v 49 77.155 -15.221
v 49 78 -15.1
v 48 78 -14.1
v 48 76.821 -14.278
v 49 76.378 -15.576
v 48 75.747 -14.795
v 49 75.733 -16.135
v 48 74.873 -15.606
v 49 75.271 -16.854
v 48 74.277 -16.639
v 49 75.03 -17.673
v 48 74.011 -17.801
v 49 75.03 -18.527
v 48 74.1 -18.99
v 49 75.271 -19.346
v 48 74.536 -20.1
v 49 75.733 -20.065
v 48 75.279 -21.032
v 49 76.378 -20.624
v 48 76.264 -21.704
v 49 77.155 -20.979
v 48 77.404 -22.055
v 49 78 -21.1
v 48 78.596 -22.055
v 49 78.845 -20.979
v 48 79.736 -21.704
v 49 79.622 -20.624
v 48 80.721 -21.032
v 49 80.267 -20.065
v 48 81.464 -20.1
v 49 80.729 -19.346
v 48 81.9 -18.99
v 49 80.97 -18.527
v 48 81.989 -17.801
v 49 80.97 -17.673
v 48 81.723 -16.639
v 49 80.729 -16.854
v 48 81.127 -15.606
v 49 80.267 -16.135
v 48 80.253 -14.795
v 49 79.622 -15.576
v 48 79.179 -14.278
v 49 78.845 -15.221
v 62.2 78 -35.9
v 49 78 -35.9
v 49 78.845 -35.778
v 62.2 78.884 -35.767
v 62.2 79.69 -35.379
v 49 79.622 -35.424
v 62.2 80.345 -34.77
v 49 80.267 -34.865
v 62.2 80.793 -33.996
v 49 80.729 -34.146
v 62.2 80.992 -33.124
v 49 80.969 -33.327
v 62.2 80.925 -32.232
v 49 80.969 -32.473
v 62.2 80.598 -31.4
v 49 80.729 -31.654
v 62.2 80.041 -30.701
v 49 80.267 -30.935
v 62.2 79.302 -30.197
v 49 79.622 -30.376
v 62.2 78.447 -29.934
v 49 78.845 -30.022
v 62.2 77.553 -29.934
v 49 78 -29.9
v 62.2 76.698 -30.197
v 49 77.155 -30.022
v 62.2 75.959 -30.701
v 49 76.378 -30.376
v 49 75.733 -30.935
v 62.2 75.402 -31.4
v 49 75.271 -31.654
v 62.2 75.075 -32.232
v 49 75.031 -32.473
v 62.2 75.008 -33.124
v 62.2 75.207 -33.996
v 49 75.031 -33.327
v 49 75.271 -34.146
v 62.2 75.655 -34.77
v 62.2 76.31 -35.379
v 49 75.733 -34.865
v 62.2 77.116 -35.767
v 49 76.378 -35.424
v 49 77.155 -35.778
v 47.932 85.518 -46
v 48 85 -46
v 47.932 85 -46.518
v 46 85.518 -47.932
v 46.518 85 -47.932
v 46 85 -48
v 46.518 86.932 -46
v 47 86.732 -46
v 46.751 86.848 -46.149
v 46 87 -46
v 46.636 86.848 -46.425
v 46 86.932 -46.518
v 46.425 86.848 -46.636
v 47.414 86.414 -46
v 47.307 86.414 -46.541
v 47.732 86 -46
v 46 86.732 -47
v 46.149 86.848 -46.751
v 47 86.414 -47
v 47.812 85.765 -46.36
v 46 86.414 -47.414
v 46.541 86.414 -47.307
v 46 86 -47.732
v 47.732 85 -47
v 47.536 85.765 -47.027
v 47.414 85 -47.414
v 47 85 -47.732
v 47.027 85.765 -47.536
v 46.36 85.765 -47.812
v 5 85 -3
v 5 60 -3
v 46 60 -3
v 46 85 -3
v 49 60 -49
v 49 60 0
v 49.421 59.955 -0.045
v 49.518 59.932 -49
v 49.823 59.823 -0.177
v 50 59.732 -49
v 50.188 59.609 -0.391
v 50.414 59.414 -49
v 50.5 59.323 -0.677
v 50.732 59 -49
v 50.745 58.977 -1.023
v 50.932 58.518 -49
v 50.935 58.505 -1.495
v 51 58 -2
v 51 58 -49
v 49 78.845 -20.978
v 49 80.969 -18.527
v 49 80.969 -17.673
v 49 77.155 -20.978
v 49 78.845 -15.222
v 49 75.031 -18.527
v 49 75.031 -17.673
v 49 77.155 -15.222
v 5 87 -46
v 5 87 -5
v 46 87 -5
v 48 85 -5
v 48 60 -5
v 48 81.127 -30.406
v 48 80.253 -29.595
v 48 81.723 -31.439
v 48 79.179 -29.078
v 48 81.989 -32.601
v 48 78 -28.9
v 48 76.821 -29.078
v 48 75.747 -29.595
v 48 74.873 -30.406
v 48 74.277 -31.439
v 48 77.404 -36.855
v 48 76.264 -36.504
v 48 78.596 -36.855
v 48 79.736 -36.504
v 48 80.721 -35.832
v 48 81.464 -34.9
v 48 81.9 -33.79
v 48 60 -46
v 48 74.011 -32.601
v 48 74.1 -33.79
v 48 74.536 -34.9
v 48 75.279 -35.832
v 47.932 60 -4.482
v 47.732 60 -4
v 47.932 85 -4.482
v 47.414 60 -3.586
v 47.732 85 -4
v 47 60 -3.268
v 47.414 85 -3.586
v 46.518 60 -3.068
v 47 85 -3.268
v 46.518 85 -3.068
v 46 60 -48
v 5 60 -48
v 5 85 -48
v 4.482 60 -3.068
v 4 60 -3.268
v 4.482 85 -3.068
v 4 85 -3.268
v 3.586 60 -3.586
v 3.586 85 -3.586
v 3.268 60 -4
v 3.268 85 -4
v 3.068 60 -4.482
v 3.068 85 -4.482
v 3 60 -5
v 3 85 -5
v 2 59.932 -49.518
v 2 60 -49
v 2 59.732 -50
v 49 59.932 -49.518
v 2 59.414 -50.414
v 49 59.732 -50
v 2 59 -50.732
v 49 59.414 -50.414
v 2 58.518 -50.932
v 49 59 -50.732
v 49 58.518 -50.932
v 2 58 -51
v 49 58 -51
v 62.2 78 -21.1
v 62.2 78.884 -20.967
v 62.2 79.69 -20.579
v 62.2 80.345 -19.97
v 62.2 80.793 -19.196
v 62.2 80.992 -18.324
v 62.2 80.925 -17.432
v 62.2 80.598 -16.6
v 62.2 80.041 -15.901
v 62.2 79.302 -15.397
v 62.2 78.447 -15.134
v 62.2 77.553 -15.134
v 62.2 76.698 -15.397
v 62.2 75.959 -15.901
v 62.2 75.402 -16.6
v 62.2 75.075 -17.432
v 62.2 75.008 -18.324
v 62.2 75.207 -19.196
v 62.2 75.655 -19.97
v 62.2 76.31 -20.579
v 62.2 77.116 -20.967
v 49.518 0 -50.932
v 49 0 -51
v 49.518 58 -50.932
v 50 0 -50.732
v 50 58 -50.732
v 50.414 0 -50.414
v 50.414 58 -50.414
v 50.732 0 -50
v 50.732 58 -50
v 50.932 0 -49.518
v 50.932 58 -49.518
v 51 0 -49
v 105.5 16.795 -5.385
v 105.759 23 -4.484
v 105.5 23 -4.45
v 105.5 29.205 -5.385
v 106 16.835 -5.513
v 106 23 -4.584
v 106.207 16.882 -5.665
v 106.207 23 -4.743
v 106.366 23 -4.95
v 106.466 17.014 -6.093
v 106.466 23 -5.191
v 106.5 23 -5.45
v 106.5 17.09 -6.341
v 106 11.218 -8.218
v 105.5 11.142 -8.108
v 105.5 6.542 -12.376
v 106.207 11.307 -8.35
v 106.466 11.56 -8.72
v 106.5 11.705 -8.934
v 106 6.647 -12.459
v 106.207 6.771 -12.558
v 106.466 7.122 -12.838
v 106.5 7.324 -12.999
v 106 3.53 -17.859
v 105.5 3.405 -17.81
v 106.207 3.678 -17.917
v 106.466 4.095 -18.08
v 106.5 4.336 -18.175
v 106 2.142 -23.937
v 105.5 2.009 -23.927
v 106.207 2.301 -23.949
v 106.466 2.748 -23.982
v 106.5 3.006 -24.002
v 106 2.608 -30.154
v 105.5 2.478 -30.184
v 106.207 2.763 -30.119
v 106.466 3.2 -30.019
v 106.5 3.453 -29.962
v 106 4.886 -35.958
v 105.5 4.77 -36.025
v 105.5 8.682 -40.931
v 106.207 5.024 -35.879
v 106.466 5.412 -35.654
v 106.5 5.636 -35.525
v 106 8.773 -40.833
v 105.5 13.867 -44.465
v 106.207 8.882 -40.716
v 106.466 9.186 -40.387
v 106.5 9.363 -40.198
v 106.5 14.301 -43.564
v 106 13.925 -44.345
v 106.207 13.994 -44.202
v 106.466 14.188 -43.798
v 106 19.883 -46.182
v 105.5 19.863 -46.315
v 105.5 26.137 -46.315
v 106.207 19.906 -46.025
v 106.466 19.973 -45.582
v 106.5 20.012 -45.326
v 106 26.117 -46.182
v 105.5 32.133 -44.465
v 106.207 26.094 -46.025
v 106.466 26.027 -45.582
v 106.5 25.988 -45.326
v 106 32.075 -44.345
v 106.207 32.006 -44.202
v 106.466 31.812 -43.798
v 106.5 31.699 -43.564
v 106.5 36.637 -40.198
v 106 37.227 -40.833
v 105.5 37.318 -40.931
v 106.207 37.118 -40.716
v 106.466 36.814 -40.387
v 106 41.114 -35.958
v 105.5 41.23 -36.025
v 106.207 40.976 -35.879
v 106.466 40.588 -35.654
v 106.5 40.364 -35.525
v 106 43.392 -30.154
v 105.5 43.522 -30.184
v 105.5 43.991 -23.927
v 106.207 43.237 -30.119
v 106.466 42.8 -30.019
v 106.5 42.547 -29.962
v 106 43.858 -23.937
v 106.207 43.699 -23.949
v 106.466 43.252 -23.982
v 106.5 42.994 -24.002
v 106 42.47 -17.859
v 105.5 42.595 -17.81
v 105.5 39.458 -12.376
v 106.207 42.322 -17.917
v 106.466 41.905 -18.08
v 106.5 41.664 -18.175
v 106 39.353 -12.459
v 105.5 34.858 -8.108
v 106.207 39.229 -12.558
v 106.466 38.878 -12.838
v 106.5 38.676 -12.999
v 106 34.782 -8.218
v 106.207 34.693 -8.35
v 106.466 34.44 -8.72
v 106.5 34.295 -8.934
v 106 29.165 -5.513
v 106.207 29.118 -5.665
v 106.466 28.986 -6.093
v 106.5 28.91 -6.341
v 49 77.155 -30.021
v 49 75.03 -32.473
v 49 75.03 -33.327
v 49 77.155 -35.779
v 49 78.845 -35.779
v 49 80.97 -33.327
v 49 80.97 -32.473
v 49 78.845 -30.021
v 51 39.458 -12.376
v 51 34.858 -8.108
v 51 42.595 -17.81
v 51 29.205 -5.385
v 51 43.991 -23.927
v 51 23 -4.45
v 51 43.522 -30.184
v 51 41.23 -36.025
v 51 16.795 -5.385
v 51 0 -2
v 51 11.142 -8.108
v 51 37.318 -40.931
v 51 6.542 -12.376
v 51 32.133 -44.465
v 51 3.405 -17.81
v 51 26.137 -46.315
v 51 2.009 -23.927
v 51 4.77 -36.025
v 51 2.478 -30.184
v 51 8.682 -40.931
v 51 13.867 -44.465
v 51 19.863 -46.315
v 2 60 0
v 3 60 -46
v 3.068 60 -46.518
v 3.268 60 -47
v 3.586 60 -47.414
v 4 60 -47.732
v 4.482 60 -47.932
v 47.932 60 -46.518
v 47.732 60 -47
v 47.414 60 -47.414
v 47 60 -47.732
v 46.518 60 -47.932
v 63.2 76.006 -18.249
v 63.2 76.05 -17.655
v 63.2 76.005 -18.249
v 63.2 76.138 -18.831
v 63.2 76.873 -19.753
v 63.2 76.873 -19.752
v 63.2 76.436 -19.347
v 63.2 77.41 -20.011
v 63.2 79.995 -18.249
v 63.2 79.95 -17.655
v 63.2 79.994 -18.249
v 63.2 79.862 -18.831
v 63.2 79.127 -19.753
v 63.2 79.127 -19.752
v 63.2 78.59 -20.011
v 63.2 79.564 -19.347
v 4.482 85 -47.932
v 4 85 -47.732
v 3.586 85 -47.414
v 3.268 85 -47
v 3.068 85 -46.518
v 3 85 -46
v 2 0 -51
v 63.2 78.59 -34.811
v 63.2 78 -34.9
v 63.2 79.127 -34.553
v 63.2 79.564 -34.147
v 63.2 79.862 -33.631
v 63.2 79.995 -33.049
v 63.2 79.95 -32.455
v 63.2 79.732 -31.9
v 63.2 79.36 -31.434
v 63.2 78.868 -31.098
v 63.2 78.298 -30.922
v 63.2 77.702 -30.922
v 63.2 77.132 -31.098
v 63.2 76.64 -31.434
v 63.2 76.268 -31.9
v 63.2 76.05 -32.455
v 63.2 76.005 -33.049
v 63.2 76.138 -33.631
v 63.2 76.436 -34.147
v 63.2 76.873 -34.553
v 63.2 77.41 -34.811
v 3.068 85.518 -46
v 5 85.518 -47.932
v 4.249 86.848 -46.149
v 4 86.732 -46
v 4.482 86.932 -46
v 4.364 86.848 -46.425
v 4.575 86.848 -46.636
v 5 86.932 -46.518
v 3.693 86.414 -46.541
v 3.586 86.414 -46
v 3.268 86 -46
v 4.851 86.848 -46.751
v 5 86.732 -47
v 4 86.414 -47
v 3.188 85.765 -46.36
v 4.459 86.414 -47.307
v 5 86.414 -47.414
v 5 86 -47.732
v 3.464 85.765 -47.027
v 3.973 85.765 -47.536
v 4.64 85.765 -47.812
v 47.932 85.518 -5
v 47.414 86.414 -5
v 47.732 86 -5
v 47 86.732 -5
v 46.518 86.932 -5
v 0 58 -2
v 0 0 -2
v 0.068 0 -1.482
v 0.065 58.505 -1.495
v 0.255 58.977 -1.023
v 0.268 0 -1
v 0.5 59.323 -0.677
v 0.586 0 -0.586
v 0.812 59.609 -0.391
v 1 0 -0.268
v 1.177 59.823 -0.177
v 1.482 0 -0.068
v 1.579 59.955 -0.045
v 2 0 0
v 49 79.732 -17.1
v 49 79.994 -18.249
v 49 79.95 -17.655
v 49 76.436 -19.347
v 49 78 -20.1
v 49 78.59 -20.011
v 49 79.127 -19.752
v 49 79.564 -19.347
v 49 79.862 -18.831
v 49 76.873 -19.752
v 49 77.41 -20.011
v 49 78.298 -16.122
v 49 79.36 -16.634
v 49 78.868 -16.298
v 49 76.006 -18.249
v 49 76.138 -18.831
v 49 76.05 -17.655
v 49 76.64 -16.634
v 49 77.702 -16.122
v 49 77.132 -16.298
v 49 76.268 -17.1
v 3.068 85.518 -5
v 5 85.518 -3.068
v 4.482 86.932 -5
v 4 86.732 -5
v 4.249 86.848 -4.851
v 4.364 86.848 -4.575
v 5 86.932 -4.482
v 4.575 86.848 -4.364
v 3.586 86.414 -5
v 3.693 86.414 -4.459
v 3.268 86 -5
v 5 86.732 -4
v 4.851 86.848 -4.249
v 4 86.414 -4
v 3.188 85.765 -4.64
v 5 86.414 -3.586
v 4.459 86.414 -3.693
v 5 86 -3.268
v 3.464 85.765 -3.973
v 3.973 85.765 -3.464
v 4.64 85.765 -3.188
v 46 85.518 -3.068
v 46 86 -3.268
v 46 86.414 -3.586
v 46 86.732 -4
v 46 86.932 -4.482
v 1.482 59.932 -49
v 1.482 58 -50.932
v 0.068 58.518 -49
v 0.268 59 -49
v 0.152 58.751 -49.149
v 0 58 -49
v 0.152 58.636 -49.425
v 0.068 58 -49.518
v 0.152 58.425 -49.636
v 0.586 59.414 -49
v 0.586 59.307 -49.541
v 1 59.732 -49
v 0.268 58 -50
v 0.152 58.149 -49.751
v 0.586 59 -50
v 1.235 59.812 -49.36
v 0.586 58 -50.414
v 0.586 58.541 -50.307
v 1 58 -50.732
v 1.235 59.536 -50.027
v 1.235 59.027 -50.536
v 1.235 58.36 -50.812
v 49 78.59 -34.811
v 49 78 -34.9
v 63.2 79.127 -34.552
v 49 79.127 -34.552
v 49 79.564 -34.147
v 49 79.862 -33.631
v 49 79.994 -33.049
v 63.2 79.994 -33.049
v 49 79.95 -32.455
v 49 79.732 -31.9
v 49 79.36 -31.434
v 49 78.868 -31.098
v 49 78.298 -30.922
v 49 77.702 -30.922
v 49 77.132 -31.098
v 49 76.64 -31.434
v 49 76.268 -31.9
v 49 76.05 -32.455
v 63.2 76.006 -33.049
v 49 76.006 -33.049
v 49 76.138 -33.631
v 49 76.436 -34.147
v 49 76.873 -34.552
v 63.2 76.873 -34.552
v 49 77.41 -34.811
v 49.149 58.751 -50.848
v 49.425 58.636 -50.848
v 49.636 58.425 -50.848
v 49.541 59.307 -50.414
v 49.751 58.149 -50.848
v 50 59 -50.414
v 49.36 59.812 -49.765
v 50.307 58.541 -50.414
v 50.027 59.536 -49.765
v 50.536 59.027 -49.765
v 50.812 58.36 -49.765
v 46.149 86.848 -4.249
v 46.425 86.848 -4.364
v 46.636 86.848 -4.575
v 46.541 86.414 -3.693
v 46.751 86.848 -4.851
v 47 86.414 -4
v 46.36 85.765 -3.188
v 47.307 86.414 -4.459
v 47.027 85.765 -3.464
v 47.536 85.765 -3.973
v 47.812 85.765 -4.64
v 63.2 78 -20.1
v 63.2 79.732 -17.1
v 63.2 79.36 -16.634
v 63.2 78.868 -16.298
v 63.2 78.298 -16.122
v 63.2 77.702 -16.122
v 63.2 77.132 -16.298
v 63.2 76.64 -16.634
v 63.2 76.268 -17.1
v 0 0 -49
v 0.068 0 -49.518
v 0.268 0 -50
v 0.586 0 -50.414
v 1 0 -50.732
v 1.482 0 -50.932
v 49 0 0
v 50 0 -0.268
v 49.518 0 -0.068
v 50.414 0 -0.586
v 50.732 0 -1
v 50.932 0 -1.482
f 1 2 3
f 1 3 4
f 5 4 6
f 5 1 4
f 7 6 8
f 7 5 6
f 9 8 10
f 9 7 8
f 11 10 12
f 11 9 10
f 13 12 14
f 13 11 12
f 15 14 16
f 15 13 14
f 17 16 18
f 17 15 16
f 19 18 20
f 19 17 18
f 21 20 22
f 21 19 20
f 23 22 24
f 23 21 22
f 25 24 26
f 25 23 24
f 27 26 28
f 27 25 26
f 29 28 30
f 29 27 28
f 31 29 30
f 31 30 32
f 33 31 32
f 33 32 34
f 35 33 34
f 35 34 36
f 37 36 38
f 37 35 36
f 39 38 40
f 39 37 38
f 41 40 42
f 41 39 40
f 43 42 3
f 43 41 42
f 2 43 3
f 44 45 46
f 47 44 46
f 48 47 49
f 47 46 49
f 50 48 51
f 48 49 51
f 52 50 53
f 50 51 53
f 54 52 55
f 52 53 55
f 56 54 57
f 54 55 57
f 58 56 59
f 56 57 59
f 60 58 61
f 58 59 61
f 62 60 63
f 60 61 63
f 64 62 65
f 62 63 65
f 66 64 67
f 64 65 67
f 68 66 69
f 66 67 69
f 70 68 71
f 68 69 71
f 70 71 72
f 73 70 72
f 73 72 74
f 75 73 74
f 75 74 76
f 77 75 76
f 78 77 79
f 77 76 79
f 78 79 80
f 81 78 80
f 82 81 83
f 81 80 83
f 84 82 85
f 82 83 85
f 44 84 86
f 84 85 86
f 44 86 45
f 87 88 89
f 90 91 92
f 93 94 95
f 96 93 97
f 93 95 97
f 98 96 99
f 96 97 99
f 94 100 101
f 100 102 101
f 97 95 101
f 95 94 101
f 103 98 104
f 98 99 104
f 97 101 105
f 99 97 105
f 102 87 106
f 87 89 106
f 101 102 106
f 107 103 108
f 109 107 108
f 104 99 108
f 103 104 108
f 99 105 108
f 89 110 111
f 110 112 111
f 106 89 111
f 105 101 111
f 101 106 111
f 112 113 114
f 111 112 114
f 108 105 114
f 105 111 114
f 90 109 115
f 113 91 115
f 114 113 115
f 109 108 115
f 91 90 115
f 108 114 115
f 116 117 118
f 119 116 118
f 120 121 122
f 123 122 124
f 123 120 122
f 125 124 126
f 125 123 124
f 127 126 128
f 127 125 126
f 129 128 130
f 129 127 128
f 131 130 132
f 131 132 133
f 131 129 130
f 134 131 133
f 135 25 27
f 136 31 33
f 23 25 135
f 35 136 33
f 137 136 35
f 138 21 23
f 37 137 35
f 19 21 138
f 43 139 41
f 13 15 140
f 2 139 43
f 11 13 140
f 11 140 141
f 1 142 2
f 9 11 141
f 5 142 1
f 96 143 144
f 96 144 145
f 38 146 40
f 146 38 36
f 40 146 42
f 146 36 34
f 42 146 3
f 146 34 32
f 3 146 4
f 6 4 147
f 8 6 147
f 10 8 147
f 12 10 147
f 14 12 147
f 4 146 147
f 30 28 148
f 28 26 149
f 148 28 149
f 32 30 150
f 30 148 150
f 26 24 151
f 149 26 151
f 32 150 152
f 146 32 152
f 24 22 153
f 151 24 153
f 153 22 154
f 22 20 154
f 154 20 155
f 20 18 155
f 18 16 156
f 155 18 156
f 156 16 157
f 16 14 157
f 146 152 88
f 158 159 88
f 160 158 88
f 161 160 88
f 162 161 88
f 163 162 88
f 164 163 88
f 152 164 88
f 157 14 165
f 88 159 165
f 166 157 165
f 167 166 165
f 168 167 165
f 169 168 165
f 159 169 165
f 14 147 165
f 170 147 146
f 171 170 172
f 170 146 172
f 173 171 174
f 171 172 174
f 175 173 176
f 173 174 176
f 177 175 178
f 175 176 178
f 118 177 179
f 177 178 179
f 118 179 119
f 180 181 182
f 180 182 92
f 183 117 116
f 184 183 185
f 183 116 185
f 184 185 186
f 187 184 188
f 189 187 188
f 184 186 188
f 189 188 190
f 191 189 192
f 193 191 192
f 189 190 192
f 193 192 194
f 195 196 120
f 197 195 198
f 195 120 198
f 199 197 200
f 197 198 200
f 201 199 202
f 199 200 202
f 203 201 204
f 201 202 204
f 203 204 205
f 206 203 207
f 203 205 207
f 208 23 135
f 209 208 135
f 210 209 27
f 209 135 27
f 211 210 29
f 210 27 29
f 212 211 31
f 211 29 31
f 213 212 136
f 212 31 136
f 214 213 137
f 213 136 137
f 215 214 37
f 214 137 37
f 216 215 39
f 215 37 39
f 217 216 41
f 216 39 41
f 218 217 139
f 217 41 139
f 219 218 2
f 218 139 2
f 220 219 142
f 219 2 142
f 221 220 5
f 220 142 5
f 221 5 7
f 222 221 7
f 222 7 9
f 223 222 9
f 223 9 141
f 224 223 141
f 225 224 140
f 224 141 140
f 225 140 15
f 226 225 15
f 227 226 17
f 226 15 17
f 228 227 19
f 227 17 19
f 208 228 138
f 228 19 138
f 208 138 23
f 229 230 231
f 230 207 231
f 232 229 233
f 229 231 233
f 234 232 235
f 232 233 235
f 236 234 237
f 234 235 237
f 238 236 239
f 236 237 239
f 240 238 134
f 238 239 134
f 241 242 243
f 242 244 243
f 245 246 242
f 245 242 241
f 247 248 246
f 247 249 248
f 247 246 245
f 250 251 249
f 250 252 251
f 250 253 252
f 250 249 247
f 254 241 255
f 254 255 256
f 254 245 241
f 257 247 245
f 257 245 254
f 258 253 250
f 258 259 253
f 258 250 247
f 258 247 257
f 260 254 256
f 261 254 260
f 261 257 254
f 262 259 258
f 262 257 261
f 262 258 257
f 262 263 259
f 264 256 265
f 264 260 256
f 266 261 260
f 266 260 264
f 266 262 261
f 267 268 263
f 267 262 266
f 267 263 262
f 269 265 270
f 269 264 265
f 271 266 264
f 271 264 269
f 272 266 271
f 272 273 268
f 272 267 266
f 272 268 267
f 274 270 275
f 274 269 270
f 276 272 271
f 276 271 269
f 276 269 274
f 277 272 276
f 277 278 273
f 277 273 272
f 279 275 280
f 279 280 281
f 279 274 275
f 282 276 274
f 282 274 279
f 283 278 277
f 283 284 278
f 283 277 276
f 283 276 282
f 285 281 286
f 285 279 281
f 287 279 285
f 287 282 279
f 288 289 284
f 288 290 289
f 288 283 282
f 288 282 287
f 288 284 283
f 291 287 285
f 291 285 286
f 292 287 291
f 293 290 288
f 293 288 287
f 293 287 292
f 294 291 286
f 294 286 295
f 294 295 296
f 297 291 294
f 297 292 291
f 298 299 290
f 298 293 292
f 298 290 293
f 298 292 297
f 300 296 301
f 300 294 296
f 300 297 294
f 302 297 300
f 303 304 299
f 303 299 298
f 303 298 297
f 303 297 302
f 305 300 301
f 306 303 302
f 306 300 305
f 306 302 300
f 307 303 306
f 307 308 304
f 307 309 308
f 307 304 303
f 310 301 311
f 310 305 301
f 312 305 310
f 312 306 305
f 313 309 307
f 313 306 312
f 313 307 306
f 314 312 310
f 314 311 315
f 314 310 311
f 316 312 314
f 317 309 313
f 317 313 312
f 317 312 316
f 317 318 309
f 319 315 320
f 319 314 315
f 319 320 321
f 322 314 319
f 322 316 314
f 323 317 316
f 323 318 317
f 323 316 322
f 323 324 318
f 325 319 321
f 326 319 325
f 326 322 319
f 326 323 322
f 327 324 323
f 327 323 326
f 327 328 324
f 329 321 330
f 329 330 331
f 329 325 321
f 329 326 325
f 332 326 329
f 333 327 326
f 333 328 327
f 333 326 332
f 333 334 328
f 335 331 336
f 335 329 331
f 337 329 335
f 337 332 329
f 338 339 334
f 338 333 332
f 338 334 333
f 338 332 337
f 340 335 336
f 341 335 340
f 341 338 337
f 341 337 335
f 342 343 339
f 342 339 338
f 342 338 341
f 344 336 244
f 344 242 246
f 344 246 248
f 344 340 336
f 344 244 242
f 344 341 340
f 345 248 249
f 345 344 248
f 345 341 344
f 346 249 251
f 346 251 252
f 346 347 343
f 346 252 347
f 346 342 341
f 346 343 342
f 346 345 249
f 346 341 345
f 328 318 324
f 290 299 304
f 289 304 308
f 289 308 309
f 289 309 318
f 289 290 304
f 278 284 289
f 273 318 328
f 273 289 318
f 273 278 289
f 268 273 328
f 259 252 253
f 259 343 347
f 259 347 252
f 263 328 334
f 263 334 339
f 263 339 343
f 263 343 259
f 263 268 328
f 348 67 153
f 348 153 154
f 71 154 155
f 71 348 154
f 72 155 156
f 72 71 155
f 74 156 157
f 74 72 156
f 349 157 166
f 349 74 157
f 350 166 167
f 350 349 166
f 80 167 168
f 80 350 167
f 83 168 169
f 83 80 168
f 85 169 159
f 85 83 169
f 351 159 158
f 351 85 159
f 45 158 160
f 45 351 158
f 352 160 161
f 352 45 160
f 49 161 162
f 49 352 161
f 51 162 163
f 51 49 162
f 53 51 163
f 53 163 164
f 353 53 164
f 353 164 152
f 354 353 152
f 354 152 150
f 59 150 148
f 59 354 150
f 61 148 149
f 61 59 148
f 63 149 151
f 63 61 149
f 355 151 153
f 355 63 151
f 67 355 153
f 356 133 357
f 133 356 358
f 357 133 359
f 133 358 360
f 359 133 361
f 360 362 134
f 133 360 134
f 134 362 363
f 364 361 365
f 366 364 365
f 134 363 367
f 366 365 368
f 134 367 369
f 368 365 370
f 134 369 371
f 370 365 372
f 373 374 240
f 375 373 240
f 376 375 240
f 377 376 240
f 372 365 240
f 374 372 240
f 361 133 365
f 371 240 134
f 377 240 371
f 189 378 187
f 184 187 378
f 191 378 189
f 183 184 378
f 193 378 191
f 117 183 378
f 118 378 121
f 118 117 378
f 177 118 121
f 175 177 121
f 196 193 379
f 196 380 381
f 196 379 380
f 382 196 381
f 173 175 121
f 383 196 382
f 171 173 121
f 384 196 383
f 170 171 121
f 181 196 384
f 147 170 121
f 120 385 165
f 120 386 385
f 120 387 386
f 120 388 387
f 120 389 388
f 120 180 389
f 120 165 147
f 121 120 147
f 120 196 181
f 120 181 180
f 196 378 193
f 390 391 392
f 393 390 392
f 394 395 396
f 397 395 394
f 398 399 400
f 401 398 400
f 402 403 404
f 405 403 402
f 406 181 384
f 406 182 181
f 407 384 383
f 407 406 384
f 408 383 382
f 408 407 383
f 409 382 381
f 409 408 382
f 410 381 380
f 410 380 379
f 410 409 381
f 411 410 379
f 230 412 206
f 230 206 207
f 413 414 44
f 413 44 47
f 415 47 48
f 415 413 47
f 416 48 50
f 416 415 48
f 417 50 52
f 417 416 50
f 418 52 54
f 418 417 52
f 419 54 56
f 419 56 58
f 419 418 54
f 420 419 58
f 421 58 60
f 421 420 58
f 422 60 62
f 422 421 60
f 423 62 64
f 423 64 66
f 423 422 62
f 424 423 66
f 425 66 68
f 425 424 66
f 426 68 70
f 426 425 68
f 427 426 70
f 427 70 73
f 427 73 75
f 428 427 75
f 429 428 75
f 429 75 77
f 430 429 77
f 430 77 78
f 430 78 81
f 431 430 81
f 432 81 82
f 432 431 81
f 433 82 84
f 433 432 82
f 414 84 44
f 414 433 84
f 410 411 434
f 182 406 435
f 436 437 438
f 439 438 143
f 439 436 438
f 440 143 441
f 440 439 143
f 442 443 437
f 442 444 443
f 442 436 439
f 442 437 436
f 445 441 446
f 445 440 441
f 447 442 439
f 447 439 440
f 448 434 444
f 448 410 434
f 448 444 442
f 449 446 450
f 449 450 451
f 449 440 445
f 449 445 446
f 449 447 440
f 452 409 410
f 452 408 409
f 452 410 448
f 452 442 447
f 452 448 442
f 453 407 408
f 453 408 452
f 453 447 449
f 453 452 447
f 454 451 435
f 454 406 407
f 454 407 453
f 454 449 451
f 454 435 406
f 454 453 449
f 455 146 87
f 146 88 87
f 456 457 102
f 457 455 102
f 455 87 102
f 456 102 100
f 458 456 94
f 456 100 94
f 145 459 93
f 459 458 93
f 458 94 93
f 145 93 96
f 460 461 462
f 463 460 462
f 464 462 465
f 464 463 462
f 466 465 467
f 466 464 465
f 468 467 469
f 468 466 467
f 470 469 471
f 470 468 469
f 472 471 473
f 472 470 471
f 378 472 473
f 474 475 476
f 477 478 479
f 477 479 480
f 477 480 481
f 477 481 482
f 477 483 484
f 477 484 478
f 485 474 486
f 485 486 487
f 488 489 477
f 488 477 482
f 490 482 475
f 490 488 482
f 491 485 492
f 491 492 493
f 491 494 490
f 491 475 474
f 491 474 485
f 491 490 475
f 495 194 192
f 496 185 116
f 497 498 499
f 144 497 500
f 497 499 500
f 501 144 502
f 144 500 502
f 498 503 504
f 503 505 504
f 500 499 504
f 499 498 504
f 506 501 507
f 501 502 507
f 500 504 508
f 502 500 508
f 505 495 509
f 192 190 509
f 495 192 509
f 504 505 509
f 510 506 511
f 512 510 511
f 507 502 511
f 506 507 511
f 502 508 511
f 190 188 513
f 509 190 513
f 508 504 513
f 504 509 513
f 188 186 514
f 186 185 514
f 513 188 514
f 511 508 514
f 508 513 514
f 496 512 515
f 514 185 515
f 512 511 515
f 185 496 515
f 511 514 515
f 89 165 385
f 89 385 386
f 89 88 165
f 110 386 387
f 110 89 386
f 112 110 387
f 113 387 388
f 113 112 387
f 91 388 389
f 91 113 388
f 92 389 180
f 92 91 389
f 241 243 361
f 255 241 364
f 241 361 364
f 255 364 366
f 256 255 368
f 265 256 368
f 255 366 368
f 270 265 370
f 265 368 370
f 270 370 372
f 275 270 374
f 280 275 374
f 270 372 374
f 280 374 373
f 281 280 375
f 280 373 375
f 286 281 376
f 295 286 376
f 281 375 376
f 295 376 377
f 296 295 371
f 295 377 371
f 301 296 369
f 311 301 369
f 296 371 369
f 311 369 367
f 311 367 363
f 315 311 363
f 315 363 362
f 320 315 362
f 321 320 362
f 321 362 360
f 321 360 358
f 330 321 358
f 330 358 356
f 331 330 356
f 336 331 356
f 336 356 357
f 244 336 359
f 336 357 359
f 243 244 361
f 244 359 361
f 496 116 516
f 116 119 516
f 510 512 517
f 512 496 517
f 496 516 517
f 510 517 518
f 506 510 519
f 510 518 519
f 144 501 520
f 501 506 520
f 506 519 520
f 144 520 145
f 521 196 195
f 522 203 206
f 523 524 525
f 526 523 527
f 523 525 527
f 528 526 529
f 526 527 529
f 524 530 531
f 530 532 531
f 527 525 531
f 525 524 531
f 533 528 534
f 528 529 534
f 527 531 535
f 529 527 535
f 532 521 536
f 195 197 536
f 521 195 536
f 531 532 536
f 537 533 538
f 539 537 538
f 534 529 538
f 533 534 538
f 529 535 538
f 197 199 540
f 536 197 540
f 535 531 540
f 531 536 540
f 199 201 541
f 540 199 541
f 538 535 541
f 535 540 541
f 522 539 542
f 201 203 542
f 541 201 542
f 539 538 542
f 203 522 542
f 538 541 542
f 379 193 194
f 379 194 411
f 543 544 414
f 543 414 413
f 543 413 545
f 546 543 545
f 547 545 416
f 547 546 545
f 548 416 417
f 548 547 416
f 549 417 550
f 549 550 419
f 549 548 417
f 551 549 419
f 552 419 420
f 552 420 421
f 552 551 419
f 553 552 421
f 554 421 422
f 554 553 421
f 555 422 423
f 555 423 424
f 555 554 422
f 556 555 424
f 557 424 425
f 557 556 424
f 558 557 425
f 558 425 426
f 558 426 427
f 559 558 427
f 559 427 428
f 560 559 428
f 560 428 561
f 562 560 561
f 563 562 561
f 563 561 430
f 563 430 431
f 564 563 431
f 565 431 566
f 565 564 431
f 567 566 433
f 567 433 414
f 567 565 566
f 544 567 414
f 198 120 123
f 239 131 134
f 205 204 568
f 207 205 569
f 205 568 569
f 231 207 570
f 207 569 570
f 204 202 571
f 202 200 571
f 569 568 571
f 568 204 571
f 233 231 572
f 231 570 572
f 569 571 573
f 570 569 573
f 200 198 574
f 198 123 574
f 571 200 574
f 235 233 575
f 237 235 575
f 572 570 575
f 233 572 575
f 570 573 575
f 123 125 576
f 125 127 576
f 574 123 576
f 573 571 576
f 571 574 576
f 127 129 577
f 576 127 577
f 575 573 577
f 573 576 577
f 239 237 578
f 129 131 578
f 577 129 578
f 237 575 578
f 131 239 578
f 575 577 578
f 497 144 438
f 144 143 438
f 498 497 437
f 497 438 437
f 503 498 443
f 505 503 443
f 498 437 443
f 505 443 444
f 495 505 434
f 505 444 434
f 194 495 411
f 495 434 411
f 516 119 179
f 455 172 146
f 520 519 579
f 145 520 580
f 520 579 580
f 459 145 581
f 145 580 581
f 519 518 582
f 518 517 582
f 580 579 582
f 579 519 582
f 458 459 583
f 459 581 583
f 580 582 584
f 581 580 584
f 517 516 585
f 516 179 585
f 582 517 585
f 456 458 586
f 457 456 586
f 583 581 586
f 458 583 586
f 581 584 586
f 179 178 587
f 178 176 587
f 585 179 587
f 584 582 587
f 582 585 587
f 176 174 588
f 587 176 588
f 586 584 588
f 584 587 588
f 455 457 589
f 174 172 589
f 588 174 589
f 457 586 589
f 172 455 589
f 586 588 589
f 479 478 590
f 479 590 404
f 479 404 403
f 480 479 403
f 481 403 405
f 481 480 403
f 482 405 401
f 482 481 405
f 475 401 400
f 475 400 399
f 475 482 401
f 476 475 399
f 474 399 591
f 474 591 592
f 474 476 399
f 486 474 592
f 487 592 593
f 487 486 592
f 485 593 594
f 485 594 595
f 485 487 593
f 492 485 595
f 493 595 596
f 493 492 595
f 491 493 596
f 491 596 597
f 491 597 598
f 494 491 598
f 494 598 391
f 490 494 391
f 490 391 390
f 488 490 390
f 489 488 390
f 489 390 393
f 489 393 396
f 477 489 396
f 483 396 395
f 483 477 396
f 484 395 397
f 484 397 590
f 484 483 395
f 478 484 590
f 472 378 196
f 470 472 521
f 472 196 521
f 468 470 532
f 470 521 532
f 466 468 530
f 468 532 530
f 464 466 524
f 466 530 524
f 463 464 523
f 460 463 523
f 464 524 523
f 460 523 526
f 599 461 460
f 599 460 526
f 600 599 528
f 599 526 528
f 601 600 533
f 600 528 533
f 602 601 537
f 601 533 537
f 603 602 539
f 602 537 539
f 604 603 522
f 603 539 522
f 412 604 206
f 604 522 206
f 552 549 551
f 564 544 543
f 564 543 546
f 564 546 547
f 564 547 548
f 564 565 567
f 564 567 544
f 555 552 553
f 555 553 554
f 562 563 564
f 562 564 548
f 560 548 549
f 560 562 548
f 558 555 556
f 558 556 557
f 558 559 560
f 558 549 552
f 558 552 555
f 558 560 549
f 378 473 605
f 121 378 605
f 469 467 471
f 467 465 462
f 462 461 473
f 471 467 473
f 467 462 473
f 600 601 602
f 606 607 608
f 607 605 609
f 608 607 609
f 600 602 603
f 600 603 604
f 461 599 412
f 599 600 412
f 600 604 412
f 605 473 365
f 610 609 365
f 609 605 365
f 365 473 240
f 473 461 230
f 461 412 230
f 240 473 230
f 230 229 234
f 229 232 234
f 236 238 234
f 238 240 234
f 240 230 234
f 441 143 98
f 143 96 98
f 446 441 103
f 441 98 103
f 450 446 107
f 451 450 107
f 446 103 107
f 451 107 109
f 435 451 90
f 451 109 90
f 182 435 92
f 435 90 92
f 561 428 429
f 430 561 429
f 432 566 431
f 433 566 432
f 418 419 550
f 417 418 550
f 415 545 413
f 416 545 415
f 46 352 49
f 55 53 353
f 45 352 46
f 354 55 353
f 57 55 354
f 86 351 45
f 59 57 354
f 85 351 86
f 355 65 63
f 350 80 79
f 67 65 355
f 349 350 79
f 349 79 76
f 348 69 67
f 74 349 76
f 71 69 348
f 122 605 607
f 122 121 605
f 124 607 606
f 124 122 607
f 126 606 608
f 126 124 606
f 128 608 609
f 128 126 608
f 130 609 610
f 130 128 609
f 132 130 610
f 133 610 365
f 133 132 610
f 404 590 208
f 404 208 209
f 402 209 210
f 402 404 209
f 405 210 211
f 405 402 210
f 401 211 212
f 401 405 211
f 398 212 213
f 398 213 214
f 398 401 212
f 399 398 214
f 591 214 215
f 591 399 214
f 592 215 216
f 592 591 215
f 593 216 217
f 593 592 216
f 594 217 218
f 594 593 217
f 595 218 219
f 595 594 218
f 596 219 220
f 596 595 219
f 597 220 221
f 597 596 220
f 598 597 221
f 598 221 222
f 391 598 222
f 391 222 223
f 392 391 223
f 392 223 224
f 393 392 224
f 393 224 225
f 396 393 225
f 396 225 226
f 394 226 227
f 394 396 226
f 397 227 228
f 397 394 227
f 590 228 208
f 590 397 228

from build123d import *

# Parameters (mm, degrees)
ESQUISSE1_W        = 51
ESQUISSE1_H        = 51
BOSS_EXTRU_1_DEPTH = 60
ESQUISSE2_W        = 45
ESQUISSE2_H        = 45
BOSS_EXTRU_2_DEPTH = 27
ESQUISSE3_R        = 21.05
BOSS_EXTRU_3_DEPTH = 55.5
ESQUISSE4_R        = 4
BOSS_EXTRU_4_DEPTH = 1
ESQUISSE5_R        = 3
ESQUISSE5_R_2      = 2
BOSS_EXTRU_5_DEPTH = 14.2
CHANFREIN1_SIZE    = 1
CONG_1_R           = 2
CONG_2_R           = 2
CONG_3_R           = 1


with BuildPart() as part:
    # Esquisse1 → Boss.-Extru.1 (new body)
    with BuildSketch(Plane(origin=(0, 0, 0), x_dir=(1, 0, 0), z_dir=(0, 1, 0))):
        with Locations((25.5, 25.5)):
            Rectangle(ESQUISSE1_W, ESQUISSE1_H)
    extrude(amount=BOSS_EXTRU_1_DEPTH)

    # Esquisse2 → Boss.-Extru.2 (add)
    with BuildSketch(Plane(origin=(0, 60, 0), x_dir=(1, 0, 0), z_dir=(0, 1, 0))):
        with Locations((25.5, 25.5)):
            Rectangle(ESQUISSE2_W, ESQUISSE2_H)
    extrude(amount=BOSS_EXTRU_2_DEPTH)

    # Esquisse3 → Boss.-Extru.3 (add)
    with BuildSketch(Plane(origin=(51, 0, 0), x_dir=(0, 0, -1), z_dir=(1, 0, 0))):
        with Locations(Location((25.5, 23, 0), (0, 0, 180))):
            Circle(ESQUISSE3_R)
    extrude(amount=BOSS_EXTRU_3_DEPTH)

    # Esquisse4 → Boss.-Extru.4 (add)
    with BuildSketch(Plane(origin=(48, 0, 0), x_dir=(0, 0, -1), z_dir=(1, 0, 0))):
        with Locations(Location((18.1, 78, 0), (0, 0, 180))):
            Circle(ESQUISSE4_R)
        with Locations(Location((32.9, 78, 0), (0, 0, 180))):
            Circle(ESQUISSE4_R)
    extrude(amount=BOSS_EXTRU_4_DEPTH)

    # Esquisse5 → Boss.-Extru.5 (add)
    # profile 1 of 2: a face of its own
    with BuildSketch(Plane(origin=(49, 0, 0), x_dir=(0, 0, -1), z_dir=(1, 0, 0))):
        with Locations((18.1, 78)):
            Circle(ESQUISSE5_R)
        with Locations((18.1, 78)):
            Circle(ESQUISSE5_R_2, mode=Mode.SUBTRACT)
    # profile 2 of 2: a face of its own
    with BuildSketch(Plane(origin=(49, 0, 0), x_dir=(0, 0, -1), z_dir=(1, 0, 0))):
        with Locations((32.9, 78)):
            Circle(ESQUISSE5_R)
        with Locations((32.9, 78)):
            Circle(ESQUISSE5_R_2, mode=Mode.SUBTRACT)
    extrude(amount=BOSS_EXTRU_5_DEPTH)

    # Chanfrein1
    chanfrein1_edges = [part.edges().sort_by_distance(p)[0] for p in [
        (49, 78, -22.1),
        (49, 78, -36.9),
        (63.2, 78, -15.1),
        (63.2, 78, -29.9),
    ]]
    chamfer(chanfrein1_edges, length=CHANFREIN1_SIZE - 0.0001)  # a hair under: the kernel refuses the full size

    # Congé1
    cong_1_edges = [part.edges().sort_by_distance(p)[0] for p in [
        (3, 73.5, -48),
        (3, 73.5, -3),
        (48, 73.5, -3),
        (48, 73.5, -48),
        (3, 87, -25.5),
        (25.5, 87, -3),
        (48, 87, -25.5),
        (25.5, 87, -48),
    ]]
    fillet(cong_1_edges, radius=CONG_1_R)

    # Congé2
    cong_2_edges = [part.edges().sort_by_distance(p)[0] for p in [
        (51, 60, -25.5),
        (25.5, 60, -51),
        (0, 60, -25.5),
        (0, 30, -51),
        (51, 30, -51),
        (51, 30, 0),
        (0, 30, 0),
    ]]
    fillet(cong_2_edges, radius=CONG_2_R)

    # Congé3
    cong_3_edges = [part.edges().sort_by_distance(p)[0] for p in [
        (106.5, 23, -46.55),
    ]]
    fillet(cong_3_edges, radius=CONG_3_R)


solid = part.part
